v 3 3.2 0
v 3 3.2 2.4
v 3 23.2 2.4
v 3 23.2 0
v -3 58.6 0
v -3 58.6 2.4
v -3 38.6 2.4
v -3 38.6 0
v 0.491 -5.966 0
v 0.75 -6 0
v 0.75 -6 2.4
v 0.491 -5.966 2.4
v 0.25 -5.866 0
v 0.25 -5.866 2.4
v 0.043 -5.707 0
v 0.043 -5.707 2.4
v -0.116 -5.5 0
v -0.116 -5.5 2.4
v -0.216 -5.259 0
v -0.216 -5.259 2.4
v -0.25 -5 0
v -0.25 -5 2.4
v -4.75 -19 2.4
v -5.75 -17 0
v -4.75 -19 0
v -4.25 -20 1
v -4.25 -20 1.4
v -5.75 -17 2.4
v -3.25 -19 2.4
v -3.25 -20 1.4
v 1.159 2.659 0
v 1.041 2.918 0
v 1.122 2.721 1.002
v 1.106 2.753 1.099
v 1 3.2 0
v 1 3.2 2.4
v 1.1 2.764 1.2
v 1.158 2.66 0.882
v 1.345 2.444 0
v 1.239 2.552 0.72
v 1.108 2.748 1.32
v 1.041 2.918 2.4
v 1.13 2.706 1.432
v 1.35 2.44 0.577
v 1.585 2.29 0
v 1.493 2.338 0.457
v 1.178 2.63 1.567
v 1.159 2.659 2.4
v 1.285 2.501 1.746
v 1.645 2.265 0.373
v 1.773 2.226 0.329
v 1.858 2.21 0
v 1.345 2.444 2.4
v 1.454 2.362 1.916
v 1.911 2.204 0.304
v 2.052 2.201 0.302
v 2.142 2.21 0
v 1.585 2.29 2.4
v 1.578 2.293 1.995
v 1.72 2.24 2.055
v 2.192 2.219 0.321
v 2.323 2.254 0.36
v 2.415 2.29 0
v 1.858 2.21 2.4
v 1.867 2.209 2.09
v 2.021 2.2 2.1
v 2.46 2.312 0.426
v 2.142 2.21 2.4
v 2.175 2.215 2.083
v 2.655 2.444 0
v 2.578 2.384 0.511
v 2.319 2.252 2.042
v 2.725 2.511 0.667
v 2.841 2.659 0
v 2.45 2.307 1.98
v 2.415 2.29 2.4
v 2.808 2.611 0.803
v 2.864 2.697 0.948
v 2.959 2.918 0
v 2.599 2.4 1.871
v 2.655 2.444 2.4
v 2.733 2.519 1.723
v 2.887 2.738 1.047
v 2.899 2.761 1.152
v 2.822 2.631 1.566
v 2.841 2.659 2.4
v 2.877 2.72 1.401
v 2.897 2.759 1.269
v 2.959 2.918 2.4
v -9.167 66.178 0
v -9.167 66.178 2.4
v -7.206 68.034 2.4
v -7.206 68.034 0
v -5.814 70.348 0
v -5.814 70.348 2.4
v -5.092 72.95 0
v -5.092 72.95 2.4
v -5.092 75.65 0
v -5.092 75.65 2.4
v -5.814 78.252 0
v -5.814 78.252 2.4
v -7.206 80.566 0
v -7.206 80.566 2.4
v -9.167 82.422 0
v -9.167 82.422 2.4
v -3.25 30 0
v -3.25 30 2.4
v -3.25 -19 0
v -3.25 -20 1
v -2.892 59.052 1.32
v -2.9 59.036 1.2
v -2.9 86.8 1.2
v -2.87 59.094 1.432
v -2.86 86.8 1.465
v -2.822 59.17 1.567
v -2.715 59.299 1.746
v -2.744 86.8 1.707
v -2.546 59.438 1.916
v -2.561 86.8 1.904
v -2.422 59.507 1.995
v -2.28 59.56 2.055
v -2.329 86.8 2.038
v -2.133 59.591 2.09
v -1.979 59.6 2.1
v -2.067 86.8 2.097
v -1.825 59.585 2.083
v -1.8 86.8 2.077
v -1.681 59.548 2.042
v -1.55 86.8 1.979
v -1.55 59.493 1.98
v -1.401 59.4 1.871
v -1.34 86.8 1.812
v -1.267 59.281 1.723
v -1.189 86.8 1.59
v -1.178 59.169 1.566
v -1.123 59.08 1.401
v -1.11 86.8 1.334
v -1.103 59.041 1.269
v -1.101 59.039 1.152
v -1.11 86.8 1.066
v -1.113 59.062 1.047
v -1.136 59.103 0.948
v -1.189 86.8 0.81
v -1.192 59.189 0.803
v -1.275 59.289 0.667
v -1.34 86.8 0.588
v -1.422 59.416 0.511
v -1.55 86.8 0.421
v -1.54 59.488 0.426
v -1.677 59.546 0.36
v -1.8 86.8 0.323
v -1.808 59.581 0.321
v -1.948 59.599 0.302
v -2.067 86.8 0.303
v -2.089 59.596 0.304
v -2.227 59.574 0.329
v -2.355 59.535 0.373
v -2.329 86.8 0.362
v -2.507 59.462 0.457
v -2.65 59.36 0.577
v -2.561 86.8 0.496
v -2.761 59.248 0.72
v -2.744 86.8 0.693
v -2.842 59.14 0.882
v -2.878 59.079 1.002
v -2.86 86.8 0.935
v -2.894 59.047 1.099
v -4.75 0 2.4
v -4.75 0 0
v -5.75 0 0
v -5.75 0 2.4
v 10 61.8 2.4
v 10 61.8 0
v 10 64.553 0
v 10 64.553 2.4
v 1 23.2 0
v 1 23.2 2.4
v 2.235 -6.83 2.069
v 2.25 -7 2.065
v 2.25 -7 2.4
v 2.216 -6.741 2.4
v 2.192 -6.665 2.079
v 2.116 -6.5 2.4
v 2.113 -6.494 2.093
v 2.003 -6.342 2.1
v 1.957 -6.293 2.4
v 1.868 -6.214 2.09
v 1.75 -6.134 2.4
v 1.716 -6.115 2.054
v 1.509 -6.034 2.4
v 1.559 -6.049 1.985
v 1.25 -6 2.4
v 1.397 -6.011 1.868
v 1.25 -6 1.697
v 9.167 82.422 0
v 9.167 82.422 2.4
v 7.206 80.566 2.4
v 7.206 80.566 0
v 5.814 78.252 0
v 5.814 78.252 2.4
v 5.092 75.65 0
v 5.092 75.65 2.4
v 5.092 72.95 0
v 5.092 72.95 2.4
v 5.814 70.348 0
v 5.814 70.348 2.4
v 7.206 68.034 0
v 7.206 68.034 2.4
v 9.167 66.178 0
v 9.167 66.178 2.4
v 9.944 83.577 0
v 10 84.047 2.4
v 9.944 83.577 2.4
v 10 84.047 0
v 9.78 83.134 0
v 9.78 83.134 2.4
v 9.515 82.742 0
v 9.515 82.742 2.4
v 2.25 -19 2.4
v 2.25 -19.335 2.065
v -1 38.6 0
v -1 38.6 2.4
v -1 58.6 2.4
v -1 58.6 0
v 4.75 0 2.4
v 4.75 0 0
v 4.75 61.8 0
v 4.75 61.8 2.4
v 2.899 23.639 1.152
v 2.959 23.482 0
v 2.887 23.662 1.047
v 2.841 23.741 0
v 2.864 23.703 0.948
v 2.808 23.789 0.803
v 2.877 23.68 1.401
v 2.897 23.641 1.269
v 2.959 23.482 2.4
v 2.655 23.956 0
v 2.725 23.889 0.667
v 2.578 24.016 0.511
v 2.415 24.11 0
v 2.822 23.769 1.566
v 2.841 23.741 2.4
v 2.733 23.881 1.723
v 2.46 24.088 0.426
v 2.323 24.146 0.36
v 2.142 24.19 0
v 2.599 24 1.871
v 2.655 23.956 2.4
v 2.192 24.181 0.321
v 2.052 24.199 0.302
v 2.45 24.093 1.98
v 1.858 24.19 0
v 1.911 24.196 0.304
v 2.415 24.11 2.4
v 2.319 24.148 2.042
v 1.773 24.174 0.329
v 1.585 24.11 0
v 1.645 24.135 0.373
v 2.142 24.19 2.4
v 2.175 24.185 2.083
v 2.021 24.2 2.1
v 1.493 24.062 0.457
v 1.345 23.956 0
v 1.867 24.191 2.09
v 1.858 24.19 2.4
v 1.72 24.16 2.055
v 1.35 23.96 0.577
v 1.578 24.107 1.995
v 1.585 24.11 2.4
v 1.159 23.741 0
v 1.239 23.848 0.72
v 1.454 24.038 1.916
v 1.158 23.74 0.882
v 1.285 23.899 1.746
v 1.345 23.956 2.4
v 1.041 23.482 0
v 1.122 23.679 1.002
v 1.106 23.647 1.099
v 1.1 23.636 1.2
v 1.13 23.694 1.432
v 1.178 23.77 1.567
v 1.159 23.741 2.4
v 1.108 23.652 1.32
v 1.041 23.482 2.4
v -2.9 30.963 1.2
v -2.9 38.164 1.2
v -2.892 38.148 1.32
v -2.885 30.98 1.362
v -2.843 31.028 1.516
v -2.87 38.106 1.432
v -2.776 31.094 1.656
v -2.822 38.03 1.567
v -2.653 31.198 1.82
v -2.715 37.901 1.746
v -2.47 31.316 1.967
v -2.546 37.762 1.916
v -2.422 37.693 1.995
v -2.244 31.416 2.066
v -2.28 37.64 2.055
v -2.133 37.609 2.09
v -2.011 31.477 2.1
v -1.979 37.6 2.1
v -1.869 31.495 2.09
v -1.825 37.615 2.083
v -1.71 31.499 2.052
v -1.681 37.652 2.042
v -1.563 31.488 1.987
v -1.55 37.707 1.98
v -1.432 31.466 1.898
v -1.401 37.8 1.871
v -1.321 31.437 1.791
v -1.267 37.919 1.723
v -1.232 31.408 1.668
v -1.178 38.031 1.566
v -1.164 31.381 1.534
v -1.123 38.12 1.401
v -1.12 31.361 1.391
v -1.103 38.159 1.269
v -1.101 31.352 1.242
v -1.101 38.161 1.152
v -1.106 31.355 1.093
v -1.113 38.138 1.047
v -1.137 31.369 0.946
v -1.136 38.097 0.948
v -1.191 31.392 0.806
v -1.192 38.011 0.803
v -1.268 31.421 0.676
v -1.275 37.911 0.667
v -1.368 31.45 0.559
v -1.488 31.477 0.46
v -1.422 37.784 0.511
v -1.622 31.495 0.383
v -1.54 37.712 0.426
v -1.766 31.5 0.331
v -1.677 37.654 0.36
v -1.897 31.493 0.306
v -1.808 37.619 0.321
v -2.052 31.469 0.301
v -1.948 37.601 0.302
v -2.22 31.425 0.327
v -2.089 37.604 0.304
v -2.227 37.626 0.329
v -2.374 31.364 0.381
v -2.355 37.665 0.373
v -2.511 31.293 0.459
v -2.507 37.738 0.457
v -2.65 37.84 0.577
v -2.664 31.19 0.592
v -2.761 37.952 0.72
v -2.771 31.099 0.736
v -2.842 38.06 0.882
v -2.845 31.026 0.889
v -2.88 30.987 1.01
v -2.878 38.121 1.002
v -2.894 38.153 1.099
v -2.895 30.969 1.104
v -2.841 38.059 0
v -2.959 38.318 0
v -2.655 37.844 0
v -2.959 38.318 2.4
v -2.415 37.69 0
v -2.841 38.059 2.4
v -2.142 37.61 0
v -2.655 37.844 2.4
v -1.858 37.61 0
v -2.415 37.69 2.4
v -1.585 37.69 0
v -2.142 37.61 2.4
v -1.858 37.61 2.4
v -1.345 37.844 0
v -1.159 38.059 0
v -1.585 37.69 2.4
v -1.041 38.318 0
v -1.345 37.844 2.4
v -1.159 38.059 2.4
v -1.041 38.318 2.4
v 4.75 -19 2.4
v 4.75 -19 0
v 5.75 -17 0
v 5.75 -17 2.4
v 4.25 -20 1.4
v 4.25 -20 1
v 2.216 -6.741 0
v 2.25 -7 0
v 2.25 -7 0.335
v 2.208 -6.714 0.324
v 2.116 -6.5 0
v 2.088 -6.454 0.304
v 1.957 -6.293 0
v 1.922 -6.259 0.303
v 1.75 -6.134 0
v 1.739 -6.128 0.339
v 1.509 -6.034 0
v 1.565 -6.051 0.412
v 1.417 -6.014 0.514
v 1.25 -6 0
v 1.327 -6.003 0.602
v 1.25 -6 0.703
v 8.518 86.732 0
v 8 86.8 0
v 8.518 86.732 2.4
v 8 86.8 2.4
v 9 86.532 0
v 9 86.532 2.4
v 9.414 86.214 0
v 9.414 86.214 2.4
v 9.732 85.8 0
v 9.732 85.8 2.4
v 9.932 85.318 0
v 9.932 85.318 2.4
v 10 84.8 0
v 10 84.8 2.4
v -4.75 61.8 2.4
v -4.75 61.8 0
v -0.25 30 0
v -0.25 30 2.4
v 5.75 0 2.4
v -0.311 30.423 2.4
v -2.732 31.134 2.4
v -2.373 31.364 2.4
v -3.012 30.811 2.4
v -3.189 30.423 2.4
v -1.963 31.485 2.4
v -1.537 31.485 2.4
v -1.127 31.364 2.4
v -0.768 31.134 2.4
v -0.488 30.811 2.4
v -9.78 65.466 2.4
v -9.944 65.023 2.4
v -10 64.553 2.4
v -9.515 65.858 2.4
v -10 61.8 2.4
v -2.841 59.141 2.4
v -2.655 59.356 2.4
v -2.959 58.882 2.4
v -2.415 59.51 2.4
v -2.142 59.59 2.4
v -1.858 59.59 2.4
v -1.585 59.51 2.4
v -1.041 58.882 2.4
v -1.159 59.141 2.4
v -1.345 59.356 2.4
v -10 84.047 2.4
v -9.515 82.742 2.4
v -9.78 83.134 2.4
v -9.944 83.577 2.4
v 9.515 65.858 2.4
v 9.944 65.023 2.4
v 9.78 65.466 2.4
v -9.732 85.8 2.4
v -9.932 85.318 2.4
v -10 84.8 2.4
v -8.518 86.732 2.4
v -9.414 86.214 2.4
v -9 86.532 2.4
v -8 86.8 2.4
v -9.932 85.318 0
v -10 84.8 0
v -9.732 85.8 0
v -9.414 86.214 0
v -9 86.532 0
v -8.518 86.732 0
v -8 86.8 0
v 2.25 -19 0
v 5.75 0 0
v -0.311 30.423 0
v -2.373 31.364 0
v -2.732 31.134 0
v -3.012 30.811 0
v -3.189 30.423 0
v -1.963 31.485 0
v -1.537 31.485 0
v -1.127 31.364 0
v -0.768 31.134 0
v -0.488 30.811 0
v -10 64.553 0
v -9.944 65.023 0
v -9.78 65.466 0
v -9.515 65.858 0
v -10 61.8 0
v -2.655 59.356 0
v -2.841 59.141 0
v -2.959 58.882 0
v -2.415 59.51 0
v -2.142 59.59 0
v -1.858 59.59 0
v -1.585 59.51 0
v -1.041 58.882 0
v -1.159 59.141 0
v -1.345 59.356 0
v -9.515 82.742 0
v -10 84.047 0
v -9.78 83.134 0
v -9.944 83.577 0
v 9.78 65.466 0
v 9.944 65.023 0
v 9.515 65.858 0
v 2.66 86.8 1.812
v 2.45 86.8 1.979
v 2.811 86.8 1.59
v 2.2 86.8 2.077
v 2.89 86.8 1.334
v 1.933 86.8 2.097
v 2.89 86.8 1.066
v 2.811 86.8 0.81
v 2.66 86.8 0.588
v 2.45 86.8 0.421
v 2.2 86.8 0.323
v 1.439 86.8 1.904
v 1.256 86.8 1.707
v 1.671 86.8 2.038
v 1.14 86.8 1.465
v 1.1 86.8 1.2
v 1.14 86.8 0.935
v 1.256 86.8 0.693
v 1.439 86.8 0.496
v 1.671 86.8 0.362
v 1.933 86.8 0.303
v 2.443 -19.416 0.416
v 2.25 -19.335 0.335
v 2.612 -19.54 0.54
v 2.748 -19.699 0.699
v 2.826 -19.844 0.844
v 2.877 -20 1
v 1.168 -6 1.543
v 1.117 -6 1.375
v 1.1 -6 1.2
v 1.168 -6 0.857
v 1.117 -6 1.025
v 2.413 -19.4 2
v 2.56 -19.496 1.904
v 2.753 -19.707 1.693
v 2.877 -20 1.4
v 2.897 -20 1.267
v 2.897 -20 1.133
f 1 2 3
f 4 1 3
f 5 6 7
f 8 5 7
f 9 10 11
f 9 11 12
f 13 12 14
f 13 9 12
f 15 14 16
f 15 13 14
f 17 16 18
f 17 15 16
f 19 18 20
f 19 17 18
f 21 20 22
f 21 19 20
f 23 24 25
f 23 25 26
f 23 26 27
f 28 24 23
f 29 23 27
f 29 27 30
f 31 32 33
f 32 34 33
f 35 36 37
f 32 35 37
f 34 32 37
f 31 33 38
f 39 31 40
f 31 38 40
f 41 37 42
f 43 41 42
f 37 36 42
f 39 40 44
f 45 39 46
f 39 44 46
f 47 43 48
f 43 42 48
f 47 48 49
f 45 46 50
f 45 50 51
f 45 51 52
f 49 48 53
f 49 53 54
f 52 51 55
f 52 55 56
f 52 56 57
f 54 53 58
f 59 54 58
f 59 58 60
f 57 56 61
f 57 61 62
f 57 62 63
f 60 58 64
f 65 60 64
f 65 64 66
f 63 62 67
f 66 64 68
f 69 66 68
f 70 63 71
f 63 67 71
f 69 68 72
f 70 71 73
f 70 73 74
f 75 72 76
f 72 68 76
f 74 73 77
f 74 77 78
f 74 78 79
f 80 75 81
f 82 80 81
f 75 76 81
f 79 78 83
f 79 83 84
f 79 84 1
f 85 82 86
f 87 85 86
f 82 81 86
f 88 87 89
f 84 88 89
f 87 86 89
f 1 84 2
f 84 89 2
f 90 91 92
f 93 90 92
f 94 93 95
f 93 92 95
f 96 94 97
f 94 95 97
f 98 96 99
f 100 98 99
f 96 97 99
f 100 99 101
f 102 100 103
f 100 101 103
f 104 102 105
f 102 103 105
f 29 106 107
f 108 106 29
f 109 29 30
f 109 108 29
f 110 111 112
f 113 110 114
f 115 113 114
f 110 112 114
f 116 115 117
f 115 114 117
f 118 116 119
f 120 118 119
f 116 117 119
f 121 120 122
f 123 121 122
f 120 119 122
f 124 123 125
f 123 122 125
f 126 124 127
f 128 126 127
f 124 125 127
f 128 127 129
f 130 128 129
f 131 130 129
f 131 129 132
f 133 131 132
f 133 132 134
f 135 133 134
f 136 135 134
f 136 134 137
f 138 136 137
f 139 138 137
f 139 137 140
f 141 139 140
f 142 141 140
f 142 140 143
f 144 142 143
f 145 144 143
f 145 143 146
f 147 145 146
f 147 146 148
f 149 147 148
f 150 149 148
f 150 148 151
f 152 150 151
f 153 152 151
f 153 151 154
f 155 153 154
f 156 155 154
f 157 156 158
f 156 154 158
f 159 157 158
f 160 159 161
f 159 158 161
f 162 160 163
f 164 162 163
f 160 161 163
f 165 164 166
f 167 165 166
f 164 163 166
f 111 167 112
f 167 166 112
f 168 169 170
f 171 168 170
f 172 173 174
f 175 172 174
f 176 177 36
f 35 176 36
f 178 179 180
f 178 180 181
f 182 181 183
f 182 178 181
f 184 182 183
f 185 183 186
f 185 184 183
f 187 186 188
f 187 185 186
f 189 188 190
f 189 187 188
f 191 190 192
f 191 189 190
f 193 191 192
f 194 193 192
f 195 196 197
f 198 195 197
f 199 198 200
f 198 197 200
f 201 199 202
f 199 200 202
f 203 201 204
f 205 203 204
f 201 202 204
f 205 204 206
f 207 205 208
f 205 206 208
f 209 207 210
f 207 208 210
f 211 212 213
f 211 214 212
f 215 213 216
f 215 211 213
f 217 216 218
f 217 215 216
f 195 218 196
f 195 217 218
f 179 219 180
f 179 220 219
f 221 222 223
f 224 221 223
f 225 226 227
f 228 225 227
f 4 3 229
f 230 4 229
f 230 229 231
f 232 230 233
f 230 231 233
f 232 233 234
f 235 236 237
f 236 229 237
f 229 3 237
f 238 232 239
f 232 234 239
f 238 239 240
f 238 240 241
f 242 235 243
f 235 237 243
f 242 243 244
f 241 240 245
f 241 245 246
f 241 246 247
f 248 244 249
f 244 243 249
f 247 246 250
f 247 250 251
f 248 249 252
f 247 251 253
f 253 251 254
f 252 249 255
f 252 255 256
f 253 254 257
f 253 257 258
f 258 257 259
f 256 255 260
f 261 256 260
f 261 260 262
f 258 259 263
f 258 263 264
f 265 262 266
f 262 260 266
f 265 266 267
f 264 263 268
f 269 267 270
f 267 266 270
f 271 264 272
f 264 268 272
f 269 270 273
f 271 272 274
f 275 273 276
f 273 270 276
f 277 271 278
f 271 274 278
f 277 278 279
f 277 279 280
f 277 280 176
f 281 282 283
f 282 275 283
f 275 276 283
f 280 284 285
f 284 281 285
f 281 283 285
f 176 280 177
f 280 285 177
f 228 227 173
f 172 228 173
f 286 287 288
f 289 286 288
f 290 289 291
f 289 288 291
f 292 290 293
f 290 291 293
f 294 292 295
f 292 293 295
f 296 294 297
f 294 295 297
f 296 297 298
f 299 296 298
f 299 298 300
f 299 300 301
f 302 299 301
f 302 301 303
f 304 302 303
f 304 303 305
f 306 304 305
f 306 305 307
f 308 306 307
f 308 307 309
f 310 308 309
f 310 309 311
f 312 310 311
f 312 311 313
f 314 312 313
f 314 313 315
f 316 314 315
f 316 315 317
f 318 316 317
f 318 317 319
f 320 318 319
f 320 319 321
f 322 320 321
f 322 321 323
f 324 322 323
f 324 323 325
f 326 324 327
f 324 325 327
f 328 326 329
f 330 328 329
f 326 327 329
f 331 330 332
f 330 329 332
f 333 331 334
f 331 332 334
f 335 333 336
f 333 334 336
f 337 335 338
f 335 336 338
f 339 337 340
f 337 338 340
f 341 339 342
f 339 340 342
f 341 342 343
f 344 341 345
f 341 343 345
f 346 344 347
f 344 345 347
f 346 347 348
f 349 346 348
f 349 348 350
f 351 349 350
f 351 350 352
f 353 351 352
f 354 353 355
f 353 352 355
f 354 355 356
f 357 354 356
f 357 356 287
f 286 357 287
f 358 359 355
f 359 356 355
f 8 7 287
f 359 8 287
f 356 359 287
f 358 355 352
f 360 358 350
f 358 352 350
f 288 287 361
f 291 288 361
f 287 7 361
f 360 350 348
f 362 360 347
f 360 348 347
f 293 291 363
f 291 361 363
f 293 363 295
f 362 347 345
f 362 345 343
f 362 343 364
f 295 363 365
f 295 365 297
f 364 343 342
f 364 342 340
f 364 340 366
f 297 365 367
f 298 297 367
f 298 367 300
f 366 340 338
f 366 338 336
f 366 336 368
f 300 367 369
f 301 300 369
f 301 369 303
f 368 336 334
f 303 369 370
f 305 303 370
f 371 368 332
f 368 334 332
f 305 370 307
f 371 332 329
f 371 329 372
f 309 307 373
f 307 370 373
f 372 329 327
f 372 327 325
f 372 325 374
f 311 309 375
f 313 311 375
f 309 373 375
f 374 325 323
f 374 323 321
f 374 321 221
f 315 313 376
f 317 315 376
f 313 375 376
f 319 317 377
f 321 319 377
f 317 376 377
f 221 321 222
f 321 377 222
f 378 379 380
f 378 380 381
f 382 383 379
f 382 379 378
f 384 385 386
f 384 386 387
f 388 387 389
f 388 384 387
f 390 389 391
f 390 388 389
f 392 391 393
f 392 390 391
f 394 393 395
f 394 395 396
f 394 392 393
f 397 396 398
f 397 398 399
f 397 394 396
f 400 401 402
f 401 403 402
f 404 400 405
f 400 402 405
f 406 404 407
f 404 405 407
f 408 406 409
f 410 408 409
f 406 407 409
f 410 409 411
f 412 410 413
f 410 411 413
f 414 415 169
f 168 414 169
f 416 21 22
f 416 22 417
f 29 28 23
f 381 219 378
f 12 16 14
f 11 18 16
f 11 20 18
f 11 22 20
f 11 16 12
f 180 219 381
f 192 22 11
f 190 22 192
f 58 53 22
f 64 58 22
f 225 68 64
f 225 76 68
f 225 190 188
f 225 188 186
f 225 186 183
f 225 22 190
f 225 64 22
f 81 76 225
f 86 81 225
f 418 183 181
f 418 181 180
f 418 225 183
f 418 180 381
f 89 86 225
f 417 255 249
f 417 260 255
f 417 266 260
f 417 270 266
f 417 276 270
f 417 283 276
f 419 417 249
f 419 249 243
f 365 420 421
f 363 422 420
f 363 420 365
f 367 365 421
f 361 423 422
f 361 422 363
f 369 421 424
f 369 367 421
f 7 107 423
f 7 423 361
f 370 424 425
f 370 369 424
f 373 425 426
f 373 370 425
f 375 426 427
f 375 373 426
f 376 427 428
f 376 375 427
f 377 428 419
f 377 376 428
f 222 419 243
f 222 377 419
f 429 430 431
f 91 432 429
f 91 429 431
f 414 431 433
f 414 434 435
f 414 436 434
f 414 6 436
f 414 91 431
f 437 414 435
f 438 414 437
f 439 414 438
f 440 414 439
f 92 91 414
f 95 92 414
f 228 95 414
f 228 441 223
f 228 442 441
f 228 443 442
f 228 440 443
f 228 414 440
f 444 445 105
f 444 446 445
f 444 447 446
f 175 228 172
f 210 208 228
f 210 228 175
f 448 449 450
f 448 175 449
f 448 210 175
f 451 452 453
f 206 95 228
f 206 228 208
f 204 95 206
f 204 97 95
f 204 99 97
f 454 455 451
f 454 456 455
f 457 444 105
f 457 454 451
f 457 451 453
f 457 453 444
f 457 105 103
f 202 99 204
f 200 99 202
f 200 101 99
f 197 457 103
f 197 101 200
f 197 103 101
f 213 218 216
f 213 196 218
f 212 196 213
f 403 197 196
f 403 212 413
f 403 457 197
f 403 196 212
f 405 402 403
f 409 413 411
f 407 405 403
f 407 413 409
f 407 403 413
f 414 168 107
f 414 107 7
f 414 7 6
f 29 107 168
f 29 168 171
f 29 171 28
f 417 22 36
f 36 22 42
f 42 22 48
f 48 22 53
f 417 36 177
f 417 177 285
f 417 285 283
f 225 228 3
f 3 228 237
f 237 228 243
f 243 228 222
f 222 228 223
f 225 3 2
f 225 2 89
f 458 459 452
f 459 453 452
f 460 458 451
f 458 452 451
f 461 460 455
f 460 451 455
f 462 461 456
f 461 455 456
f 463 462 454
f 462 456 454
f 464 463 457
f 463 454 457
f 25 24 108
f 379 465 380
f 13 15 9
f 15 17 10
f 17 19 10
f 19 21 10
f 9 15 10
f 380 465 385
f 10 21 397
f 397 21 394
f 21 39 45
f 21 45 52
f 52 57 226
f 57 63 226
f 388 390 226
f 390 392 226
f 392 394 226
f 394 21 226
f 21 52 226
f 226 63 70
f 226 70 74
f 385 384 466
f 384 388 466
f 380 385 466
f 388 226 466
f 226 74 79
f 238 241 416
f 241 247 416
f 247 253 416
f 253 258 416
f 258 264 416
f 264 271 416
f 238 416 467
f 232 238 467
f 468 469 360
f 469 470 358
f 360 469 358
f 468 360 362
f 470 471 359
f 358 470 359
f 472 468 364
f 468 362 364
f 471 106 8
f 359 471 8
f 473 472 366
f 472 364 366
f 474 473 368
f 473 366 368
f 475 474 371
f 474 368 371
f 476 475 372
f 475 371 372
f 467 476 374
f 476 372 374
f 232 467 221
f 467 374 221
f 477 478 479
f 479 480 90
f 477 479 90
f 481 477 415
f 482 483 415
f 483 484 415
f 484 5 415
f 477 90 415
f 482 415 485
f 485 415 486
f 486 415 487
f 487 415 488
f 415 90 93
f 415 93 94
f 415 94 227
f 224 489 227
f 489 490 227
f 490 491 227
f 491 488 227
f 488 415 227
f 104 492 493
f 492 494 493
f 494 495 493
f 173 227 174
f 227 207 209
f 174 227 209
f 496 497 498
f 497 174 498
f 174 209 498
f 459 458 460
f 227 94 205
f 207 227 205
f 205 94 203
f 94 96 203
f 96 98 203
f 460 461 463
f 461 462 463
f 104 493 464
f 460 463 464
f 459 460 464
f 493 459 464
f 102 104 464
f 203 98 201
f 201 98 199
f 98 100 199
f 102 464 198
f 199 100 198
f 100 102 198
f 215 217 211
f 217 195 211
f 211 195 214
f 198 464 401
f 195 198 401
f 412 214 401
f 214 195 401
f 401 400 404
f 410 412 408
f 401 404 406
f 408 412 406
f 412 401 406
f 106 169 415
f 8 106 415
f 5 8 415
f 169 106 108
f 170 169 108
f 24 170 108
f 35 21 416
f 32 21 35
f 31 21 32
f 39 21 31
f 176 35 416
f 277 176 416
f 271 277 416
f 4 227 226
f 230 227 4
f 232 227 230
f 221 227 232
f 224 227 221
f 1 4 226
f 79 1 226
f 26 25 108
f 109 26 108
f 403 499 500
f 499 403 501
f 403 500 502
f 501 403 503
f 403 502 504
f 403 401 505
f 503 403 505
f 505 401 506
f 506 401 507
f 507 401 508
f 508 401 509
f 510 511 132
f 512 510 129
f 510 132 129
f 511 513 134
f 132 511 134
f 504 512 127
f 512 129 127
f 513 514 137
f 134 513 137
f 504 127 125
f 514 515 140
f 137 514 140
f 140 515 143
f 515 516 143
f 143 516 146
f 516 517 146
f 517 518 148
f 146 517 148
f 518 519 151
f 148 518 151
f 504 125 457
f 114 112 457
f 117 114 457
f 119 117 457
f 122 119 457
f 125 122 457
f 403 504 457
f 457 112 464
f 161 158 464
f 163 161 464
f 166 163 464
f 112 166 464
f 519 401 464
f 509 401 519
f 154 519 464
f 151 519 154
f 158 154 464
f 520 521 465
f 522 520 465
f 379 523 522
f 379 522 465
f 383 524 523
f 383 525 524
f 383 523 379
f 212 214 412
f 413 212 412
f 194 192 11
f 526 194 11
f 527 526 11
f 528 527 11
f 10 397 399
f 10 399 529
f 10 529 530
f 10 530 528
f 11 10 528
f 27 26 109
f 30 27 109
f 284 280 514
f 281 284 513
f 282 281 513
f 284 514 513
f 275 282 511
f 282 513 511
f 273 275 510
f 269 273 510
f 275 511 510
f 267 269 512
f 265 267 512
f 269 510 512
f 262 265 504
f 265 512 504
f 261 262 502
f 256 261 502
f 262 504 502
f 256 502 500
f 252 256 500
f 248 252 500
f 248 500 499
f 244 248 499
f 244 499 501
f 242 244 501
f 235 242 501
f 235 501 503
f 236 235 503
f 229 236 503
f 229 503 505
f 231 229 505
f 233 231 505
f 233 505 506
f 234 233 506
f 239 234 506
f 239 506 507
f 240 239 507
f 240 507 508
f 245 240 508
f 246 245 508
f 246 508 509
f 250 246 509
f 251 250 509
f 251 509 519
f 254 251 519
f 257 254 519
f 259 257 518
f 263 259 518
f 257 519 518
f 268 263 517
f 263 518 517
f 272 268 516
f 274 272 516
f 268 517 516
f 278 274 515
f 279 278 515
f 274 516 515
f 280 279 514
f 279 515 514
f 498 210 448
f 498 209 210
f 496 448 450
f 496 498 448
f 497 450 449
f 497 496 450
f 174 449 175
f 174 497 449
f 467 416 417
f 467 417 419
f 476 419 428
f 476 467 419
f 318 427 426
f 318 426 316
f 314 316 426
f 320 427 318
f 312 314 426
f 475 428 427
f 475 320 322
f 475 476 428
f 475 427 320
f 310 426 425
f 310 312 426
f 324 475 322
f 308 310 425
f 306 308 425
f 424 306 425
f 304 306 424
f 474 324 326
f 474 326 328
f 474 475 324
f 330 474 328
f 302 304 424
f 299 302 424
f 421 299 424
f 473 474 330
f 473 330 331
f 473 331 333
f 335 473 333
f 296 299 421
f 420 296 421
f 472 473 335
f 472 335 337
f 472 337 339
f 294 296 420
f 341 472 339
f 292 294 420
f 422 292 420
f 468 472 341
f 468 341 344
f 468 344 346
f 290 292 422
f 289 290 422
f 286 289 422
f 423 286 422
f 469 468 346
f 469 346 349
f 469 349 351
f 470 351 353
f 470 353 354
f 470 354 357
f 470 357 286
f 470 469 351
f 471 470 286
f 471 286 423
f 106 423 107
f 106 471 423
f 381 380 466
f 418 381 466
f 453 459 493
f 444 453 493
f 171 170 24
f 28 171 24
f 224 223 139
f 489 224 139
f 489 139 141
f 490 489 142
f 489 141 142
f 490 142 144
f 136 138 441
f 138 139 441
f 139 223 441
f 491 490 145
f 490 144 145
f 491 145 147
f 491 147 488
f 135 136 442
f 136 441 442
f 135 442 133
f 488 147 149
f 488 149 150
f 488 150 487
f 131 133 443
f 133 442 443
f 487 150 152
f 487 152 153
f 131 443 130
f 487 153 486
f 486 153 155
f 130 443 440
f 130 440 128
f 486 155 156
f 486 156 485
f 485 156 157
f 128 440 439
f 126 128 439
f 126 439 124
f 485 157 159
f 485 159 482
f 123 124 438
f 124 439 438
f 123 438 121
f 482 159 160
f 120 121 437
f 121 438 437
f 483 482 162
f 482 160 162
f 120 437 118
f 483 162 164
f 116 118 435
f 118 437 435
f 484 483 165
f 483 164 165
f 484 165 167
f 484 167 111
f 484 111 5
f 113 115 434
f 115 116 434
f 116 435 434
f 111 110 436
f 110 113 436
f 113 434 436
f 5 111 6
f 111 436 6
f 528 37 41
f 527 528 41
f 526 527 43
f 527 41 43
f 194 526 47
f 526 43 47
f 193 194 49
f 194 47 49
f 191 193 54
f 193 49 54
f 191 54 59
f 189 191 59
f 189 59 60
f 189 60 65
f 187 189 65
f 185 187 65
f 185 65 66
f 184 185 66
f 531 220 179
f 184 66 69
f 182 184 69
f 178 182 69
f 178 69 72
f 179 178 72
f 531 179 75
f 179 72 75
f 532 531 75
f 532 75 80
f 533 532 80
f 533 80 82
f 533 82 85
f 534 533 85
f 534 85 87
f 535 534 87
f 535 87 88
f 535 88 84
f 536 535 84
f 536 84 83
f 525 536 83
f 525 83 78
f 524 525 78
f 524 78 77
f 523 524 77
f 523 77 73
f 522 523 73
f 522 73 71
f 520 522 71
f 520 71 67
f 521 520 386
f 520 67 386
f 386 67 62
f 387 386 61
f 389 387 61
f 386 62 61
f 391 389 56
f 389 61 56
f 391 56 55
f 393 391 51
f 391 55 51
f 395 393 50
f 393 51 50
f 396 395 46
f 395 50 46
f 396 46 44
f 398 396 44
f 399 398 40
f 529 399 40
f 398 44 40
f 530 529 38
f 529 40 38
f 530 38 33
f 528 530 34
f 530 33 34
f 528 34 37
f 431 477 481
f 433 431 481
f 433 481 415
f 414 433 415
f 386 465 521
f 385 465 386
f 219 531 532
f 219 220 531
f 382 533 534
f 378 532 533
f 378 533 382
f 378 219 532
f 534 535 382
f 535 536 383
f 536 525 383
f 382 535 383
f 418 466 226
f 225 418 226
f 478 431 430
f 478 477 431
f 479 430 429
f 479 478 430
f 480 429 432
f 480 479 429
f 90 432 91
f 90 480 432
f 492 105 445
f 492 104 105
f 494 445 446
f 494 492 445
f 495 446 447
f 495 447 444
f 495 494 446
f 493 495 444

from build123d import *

# Parameters (mm, degrees)
F1_DEPTH  = 2.4
F3_DEPTH  = 2.401
F4_R      = 0.9
F5_DEPTH  = 106.801
F7_DEPTH  = 2.4010001
F9_DEPTH  = 2.4010001
F10_SIZE2 = 1.5
F10_SIZE  = 3
F11_SIZE2 = 3
F11_SIZE  = 1.5
F12_SIZE  = 1
F14_DEPTH = 2.4010001
F15_R     = 2


with BuildPart() as f1:
    # F0 (on Top) → F1 (new body)
    with BuildSketch(Plane.XY):
        Polygon((-10, 86.8), (-10, 61.8), (-4.75, 61.8), (-4.75, 0), (-5.75, 0), (-5.75, -20), (5.75, -20), (5.75, 0), (4.75, 0), (4.75, 61.8), (10, 61.8), (10, 86.8), align=None)
    extrude(amount=F1_DEPTH)

    # F2 (on Top) → F3 (cut, through all)
    with BuildSketch(Plane.XY):
        with BuildLine():
            Line((-3.25, 30), (-3.25, -20))
            Line((-3.25, -20), (2.25, -20))
            Line((2.25, -20), (2.25, -7))
            ThreePointArc((2.25, -7), (1.9571067812, -6.2928932188), (1.25, -6))
            Line((1.25, -6), (0.75, -6))
            ThreePointArc((0.75, -6), (0.0428932188, -5.7071067812), (-0.25, -5))
            Line((-0.25, -5), (-0.25, 30))
            ThreePointArc((-0.25, 30), (-1.75, 31.5), (-3.25, 30))
        make_face()
    extrude(amount=F3_DEPTH, mode=Mode.SUBTRACT)

    # F4 (on face) → F5 (cut, through all)
    with BuildSketch(Plane(origin=(0, 86.8, 0), x_dir=(-1, 0, 0), z_dir=(0, 1, 0))):
        with Locations((-2, 1.2)):
            Circle(F4_R)
        with Locations((2, 1.2)):
            Circle(F4_R)
    extrude(amount=-F5_DEPTH, mode=Mode.SUBTRACT)

    # F6 (on face) → F7 (cut, through all)
    with BuildSketch(Plane.XY.offset(2.4)):
        with BuildLine():
            Line((1, 23.2), (1, 3.2))
            ThreePointArc((1, 3.2), (2, 2.2), (3, 3.2))
            Line((3, 3.2), (3, 23.2))
            ThreePointArc((3, 23.2), (2, 24.2), (1, 23.2))
        make_face()
    extrude(amount=-F7_DEPTH, mode=Mode.SUBTRACT)

    # F8 (on face) → F9 (cut, through all)
    with BuildSketch(Plane.XY.offset(2.4)):
        with BuildLine():
            ThreePointArc((-1, 58.6), (-2, 59.6), (-3, 58.6))
            Line((-3, 58.6), (-3, 38.6))
            ThreePointArc((-3, 38.6), (-2, 37.6), (-1, 38.6))
            Line((-1, 38.6), (-1, 58.6))
        make_face()
    extrude(amount=-F9_DEPTH, mode=Mode.SUBTRACT)

    # F10
    f10_edges = [f1.edges().sort_by_distance(p)[0] for p in [
        (5.75, -20, 1.2),
    ]]
    f10_side = f1.faces().sort_by_distance((5.75, -10, 1.2))[0]
    chamfer(f10_edges, length=F10_SIZE, length2=F10_SIZE2, reference=f10_side)

    # F11
    f11_edges = [f1.edges().sort_by_distance(p)[0] for p in [
        (-5.75, -20, 1.2),
    ]]
    f11_side = f1.faces().sort_by_distance((-4.5, -20, 1.2))[0]
    chamfer(f11_edges, length=F11_SIZE, length2=F11_SIZE2, reference=f11_side)

    # F12
    f12_edges = [f1.edges().sort_by_distance(p)[0] for p in [
        (-3.75, -20, 2.4),
        (-3.75, -20, 0),
        (3.25, -20, 2.4),
        (3.25, -20, 0),
    ]]
    chamfer(f12_edges, length=F12_SIZE)

    # F13 (on face) → F14 (cut, through all)
    with BuildSketch(Plane.XY.offset(2.4)):
        with BuildLine():
            Line((10, 65.6397459622), (10, 82.9602540378))
            ThreePointArc((10, 82.9602540378), (5, 74.3), (10, 65.6397459622))
        make_face()
        with BuildLine():
            Line((-10, 82.9602540378), (-10, 65.6397459622))
            ThreePointArc((-10, 65.6397459622), (-5, 74.3), (-10, 82.9602540378))
        make_face()
    extrude(amount=-F14_DEPTH, mode=Mode.SUBTRACT)

    # F15
    f15_edges = [f1.edges().sort_by_distance(p)[0] for p in [
        (10, 82.960254, 1.2),
        (10, 65.639746, 1.2),
        (10, 86.8, 1.2),
        (-10, 65.639746, 1.2),
        (-10, 82.960254, 1.2),
        (-10, 86.8, 1.2),
    ]]
    fillet(f15_edges, radius=F15_R)


solid = f1.part
